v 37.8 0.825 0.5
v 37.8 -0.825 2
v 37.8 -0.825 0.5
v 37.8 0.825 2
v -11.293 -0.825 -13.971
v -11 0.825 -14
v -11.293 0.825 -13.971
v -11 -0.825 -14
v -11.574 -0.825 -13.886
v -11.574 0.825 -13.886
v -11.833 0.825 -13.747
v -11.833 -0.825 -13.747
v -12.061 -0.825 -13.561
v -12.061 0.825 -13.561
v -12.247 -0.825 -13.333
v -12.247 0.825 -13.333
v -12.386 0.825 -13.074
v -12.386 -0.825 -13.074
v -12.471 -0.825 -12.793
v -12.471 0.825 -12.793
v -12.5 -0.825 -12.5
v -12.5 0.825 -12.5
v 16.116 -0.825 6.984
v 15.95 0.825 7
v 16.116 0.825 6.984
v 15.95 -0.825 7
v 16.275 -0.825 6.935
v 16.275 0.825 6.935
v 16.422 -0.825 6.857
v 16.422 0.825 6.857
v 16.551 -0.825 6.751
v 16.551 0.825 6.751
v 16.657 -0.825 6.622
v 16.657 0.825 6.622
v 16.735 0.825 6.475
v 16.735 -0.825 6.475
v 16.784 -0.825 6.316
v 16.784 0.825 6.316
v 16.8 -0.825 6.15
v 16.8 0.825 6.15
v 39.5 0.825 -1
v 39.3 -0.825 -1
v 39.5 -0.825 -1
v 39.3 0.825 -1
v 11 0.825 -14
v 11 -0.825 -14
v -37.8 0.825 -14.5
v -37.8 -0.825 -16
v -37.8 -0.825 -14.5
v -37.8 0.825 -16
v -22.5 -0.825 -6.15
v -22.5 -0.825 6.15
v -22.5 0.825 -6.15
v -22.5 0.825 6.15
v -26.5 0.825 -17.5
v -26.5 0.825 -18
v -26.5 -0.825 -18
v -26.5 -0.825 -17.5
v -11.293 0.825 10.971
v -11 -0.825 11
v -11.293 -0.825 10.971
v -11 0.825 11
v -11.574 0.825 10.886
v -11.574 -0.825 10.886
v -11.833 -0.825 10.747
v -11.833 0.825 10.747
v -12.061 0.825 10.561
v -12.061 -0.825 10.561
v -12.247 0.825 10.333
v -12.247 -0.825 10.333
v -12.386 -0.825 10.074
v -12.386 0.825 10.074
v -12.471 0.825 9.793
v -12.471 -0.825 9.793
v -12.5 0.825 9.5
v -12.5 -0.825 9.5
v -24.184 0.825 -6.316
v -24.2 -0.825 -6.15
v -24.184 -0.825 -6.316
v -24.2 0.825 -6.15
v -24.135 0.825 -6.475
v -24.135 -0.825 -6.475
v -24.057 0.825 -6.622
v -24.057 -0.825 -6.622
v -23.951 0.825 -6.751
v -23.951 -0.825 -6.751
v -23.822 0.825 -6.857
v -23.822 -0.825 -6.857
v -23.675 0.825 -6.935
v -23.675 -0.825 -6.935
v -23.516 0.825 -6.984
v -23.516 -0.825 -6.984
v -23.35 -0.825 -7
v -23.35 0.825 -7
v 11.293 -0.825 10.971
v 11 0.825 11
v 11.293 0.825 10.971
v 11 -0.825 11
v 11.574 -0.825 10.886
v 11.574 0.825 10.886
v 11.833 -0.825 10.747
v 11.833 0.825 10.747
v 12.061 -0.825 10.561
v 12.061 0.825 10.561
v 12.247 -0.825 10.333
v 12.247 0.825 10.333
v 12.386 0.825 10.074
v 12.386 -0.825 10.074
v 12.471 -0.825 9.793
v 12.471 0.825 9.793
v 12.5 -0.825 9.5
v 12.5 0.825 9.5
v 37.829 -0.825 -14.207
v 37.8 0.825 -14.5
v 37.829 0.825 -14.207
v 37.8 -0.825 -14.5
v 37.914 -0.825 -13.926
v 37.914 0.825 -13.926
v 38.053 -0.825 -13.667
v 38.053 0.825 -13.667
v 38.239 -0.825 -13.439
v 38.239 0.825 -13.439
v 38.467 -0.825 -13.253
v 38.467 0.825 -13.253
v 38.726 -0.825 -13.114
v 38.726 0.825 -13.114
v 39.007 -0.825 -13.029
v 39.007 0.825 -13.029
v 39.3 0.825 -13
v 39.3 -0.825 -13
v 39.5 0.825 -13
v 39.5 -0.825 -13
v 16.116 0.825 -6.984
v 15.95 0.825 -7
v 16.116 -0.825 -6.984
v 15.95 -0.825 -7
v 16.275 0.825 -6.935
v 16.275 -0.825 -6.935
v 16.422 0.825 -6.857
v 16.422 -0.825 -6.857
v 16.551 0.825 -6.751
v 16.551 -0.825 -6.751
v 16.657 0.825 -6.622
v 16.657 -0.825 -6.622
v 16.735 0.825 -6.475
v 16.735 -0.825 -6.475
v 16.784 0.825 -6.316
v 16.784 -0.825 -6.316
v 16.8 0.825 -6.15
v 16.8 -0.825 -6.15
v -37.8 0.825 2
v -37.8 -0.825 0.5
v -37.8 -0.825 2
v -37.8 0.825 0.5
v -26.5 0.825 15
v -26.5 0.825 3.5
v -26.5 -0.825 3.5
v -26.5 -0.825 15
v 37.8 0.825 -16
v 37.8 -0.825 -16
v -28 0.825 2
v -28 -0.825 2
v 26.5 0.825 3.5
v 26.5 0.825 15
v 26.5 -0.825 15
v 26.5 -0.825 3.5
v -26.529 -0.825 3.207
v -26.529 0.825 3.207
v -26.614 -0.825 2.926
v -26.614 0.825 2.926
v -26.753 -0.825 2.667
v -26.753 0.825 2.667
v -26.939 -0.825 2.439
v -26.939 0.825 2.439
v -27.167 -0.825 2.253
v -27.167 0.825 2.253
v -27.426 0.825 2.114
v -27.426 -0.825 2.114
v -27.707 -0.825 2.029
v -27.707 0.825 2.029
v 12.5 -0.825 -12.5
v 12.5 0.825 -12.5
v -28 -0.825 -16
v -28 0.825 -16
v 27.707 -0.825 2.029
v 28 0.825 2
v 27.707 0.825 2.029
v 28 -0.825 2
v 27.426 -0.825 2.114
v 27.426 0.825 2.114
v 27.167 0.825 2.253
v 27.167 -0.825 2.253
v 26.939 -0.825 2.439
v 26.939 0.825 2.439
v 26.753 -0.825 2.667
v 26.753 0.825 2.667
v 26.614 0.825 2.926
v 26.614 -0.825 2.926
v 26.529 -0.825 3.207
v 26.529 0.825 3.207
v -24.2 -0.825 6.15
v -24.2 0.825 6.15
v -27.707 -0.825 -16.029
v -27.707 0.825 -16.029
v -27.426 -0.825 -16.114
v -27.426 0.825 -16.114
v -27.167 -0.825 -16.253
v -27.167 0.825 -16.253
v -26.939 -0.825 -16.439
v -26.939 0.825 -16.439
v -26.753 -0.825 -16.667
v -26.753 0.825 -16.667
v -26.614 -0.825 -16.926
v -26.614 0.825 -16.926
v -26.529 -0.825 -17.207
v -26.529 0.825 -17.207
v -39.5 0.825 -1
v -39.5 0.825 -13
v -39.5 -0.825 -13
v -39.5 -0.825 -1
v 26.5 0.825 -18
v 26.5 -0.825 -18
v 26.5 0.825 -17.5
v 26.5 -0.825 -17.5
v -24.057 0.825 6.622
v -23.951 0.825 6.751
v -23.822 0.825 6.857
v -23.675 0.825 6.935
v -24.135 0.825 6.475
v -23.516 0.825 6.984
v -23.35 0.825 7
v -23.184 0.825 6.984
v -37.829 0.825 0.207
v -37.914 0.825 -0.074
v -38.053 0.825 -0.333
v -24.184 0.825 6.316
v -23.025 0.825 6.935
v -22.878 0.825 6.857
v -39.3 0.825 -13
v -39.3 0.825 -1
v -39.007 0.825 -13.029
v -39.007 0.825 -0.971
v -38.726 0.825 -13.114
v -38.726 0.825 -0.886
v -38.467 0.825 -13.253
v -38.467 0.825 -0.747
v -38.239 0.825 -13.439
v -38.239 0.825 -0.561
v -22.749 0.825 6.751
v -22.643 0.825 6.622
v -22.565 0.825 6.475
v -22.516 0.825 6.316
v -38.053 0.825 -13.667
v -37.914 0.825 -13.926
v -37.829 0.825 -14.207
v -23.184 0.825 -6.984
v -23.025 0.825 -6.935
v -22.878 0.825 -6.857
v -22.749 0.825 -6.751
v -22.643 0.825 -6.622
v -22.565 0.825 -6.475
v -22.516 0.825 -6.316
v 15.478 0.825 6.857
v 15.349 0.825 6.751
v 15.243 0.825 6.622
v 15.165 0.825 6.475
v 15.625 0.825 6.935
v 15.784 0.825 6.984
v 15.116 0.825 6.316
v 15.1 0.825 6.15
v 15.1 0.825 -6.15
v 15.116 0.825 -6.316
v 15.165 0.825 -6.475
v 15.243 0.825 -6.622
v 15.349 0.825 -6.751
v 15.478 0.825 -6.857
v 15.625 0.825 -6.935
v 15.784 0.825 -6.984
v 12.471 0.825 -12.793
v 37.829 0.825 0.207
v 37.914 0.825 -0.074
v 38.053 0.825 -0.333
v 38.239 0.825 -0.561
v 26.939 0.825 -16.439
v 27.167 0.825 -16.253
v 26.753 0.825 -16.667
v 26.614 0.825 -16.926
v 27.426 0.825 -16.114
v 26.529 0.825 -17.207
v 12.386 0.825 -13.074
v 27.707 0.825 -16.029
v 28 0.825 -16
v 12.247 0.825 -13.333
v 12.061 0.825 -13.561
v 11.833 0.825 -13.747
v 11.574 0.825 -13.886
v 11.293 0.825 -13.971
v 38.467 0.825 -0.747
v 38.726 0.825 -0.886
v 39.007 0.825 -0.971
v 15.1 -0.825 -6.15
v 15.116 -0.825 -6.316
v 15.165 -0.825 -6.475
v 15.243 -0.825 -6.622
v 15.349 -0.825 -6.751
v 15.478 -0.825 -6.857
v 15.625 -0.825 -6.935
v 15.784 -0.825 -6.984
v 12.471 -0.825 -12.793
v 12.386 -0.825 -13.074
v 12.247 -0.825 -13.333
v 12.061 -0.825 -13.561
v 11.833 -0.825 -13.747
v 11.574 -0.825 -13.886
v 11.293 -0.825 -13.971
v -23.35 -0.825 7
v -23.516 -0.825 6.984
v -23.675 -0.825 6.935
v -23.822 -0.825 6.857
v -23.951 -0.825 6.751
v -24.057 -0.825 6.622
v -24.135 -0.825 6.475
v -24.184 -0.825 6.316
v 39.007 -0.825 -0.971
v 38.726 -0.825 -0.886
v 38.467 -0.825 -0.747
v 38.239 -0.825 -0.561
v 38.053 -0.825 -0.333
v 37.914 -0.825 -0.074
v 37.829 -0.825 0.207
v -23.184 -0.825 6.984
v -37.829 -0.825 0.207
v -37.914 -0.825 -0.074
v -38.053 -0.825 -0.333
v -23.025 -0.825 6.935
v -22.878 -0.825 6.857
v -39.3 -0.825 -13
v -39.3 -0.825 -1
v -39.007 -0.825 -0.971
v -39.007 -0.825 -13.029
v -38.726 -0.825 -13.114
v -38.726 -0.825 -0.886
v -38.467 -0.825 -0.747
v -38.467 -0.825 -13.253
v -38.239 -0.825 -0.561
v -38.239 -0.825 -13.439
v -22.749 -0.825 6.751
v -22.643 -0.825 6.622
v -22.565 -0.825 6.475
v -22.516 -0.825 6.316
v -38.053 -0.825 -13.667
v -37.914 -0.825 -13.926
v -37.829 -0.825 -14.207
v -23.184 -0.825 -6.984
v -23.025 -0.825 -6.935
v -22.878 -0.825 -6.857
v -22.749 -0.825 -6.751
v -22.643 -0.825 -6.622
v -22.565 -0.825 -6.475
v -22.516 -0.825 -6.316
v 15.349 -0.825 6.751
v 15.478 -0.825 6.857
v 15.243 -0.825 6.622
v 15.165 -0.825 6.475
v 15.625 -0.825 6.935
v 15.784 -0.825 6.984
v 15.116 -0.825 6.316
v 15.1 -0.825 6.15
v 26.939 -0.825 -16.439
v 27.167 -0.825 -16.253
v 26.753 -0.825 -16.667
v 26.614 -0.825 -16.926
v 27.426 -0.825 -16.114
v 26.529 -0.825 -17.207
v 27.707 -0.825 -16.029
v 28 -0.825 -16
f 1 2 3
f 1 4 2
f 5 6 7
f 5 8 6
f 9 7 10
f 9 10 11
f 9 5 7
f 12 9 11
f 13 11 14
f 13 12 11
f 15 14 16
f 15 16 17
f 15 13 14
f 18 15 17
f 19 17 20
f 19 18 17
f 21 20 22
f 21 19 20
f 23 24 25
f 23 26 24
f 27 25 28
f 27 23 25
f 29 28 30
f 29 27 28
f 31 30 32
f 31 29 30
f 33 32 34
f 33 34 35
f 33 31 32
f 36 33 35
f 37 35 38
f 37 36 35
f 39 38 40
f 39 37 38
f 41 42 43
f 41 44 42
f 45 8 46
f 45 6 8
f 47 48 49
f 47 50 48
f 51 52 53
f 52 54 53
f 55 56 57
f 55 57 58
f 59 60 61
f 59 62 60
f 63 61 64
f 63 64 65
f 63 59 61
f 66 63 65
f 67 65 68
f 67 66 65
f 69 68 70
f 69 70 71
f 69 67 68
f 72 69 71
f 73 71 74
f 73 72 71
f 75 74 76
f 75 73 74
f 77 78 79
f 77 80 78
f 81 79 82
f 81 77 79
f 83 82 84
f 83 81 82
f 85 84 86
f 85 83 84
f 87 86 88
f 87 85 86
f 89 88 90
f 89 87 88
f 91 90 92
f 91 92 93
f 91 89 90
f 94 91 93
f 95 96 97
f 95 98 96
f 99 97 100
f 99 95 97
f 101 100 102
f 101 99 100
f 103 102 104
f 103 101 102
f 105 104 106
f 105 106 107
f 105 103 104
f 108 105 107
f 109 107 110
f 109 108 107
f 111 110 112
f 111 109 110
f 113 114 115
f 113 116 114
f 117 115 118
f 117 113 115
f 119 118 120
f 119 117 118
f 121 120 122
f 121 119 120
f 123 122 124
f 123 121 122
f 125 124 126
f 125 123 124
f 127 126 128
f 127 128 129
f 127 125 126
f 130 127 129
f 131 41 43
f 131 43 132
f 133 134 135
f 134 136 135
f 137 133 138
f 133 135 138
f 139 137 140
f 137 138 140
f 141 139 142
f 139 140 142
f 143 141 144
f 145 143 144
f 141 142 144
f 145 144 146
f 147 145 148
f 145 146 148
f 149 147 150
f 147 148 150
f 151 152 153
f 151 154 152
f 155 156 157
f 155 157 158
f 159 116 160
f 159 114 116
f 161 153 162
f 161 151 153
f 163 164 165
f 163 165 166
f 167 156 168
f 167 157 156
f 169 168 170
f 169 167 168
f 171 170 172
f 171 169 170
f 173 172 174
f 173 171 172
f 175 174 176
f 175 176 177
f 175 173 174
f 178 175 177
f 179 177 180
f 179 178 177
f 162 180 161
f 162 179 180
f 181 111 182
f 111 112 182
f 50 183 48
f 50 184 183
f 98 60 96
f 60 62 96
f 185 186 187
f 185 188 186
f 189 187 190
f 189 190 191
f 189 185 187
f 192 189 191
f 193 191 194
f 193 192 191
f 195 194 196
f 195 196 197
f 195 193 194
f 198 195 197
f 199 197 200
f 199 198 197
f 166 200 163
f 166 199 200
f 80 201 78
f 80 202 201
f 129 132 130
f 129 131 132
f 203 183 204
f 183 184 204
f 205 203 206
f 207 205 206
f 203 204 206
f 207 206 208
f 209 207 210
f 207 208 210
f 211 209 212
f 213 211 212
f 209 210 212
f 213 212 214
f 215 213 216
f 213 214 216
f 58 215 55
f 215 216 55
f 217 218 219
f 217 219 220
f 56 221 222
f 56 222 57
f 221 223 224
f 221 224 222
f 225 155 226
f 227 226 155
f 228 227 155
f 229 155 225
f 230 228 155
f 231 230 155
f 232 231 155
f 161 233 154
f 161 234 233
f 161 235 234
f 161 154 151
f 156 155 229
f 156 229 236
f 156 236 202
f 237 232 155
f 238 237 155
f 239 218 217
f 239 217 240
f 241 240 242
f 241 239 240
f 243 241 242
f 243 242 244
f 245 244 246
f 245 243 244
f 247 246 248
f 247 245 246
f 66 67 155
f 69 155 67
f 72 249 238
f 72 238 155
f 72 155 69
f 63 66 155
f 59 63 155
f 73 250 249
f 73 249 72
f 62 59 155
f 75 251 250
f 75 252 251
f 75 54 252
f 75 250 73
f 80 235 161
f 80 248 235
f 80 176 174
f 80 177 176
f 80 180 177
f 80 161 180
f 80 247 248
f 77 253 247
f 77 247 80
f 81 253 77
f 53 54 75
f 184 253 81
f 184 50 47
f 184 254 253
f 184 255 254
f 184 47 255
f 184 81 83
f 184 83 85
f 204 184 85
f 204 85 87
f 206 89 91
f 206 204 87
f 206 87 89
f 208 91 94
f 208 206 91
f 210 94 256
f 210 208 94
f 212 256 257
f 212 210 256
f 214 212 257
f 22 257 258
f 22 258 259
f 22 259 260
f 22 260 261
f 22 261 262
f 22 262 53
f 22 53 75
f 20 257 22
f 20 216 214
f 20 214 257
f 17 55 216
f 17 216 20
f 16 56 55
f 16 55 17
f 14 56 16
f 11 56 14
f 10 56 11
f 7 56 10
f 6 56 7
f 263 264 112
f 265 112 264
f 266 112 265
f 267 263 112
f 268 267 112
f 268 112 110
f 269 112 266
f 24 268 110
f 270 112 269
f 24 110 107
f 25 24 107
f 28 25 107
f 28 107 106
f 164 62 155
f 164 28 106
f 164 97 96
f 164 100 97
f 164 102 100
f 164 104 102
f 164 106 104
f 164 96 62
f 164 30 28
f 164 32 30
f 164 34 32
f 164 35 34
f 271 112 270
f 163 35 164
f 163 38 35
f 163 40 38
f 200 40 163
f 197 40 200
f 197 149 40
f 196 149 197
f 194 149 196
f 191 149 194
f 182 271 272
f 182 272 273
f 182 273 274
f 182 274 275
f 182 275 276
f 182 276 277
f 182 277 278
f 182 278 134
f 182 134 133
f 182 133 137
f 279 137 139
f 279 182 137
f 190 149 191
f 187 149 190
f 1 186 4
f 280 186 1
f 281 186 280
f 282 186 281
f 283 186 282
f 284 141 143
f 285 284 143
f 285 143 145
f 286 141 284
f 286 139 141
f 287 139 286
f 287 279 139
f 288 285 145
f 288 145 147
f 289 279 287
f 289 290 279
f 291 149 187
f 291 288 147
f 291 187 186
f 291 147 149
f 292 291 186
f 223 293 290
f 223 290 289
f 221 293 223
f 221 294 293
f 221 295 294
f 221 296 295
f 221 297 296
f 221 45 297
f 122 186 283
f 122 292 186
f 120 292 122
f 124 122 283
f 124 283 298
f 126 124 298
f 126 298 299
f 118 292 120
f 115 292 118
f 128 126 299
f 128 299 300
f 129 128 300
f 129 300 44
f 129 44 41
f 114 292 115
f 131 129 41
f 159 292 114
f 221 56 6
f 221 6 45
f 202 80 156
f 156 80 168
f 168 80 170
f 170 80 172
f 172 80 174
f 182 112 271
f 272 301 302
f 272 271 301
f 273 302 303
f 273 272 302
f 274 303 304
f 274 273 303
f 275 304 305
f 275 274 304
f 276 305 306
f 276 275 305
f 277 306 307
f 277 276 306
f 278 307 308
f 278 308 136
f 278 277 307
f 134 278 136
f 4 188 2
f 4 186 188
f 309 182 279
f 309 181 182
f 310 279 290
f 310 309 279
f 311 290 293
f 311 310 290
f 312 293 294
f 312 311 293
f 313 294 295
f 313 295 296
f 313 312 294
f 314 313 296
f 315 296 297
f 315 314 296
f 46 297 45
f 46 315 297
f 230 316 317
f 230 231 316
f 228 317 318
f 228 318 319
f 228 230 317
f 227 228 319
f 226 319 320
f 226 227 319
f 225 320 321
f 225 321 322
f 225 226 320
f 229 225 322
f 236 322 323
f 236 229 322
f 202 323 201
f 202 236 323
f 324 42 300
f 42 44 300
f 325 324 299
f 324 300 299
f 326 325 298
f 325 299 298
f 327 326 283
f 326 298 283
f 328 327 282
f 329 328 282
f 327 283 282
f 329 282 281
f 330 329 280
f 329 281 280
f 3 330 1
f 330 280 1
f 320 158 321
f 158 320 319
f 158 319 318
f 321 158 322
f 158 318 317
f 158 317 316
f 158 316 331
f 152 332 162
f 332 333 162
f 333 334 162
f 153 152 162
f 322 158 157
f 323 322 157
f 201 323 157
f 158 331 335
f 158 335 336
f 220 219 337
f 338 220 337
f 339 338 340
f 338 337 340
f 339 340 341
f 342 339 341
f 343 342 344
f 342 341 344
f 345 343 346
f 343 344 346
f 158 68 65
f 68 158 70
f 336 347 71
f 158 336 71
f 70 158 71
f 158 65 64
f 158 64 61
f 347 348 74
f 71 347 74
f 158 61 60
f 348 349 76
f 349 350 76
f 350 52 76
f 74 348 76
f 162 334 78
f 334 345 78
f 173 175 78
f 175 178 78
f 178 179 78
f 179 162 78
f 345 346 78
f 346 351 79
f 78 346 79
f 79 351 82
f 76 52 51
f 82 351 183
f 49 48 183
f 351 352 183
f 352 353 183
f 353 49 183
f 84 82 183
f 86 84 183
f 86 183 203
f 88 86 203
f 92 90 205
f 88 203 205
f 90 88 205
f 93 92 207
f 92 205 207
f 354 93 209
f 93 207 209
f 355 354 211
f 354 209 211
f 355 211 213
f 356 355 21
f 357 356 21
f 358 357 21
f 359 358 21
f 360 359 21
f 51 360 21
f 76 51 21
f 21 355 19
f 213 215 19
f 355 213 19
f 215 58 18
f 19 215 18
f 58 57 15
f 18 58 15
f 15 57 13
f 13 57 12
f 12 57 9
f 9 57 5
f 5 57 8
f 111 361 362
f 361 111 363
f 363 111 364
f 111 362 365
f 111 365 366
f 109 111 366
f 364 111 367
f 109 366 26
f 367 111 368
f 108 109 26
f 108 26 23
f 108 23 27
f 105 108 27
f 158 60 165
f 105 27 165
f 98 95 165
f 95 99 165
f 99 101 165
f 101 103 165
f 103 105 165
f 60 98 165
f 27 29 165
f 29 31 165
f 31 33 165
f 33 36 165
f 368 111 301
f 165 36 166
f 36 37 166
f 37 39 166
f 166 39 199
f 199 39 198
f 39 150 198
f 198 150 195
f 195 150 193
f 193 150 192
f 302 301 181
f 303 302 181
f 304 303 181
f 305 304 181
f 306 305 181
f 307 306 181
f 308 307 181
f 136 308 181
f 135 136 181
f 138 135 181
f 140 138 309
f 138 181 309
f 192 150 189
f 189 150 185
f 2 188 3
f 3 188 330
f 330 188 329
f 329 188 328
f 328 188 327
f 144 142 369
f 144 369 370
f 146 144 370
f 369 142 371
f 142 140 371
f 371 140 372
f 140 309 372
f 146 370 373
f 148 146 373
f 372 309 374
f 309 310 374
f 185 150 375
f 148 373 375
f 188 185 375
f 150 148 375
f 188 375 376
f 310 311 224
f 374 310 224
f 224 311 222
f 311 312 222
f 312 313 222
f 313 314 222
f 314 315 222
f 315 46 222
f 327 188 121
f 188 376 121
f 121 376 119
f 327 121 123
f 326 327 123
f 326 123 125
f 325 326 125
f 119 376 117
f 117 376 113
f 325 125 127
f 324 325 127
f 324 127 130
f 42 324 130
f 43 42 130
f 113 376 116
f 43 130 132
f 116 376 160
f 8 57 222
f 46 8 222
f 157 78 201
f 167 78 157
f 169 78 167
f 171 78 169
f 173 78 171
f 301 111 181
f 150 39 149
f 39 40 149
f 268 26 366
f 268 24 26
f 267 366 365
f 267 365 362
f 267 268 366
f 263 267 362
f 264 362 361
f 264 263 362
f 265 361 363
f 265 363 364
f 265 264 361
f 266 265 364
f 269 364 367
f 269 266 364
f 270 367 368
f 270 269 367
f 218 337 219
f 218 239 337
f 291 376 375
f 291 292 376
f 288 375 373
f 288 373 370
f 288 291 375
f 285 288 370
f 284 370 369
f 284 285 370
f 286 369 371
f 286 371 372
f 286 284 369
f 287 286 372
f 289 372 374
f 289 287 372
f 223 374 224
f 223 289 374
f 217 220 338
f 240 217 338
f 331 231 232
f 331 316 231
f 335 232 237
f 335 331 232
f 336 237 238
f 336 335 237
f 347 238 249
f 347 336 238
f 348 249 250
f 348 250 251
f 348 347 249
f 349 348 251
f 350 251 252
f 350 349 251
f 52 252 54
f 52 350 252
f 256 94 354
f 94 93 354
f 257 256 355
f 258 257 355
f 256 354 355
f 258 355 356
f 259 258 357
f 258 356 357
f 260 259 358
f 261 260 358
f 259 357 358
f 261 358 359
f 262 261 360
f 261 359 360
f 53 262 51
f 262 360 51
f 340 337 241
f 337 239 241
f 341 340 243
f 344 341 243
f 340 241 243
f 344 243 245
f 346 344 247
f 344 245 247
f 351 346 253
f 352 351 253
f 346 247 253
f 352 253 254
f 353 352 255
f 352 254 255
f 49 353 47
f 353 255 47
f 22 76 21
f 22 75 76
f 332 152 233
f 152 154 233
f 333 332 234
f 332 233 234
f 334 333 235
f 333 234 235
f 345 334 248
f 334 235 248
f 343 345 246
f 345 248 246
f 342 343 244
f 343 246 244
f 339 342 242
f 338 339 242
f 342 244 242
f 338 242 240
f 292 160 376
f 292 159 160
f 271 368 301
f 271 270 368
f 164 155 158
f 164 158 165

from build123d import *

# Parameters (mm, degrees)
SKIZZE1_W                       = 1.7
SKIZZE1_H                       = 14
SKIZZE1_W_2                     = 25
SKIZZE1_H_2                     = 25
AUFSATZ_LINEAR_AUSTRAGEN1_DEPTH = 0.825
VERRUNDUNG1_R                   = 1.5
VERRUNDUNG2_R                   = 0.85


with BuildPart() as part:
    # Skizze1 → Aufsatz-Linear austragen1 (new, symmetric)
    # profile 1 of 3: a face of its own
    with BuildSketch(Plane(origin=(0, 0, 0), x_dir=(1, 0, 0), z_dir=(0, 1, 0))):
        Polygon((26.5, 16), (26.5, 18), (-26.5, 18), (-26.5, 16), (-26.5, -2), (-26.5, -15), (26.5, -15), (26.5, -2), align=None)
        with Locations((-23.35, 0)):
            Rectangle(SKIZZE1_W, SKIZZE1_H, mode=Mode.SUBTRACT)
        with Locations((15.95, 0)):
            Rectangle(SKIZZE1_W, SKIZZE1_H, mode=Mode.SUBTRACT)
        with Locations((0, 1.5)):
            Rectangle(SKIZZE1_W_2, SKIZZE1_H_2, mode=Mode.SUBTRACT)
    # profile 2 of 3: a face of its own
    with BuildSketch(Plane(origin=(0, 0, 0), x_dir=(1, 0, 0), z_dir=(0, 1, 0))):
        Polygon((-26.5, -2), (-26.5, 16), (-37.8, 16), (-37.8, 13), (-39.5, 13), (-39.5, 1), (-37.8, 1), (-37.8, -2), align=None)
    # profile 3 of 3: a face of its own
    with BuildSketch(Plane(origin=(0, 0, 0), x_dir=(1, 0, 0), z_dir=(0, 1, 0))):
        Polygon((37.8, 16), (26.5, 16), (26.5, -2), (37.8, -2), (37.8, 1), (39.5, 1), (39.5, 13), (37.8, 13), align=None)
    extrude(amount=AUFSATZ_LINEAR_AUSTRAGEN1_DEPTH, both=True)

    # Verrundung1
    verrundung1_edges = [part.edges().sort_by_distance(p)[0] for p in [
        (-26.5, 0, 2),
        (-37.8, 0, -1),
        (-37.8, 0, -13),
        (-26.5, 0, -16),
        (26.5, 0, -16),
        (37.8, 0, -13),
        (37.8, 0, -1),
        (26.5, 0, 2),
        (-12.5, 0, -14),
        (-12.5, 0, 11),
        (12.5, 0, 11),
        (12.5, 0, -14),
    ]]
    fillet(verrundung1_edges, radius=VERRUNDUNG1_R)

    # Verrundung2
    verrundung2_edges = [part.edges().sort_by_distance(p)[0] for p in [
        (15.1, 0, 7),
        (16.8, 0, 7),
        (15.1, 0, -7),
        (16.8, 0, -7),
        (-24.2, 0, 7),
        (-22.5, 0, 7),
        (-22.5, 0, -7),
        (-24.2, 0, -7),
    ]]
    fillet(verrundung2_edges, radius=VERRUNDUNG2_R - 0.0001)  # a hair under: the kernel refuses the full size


solid = part.part
